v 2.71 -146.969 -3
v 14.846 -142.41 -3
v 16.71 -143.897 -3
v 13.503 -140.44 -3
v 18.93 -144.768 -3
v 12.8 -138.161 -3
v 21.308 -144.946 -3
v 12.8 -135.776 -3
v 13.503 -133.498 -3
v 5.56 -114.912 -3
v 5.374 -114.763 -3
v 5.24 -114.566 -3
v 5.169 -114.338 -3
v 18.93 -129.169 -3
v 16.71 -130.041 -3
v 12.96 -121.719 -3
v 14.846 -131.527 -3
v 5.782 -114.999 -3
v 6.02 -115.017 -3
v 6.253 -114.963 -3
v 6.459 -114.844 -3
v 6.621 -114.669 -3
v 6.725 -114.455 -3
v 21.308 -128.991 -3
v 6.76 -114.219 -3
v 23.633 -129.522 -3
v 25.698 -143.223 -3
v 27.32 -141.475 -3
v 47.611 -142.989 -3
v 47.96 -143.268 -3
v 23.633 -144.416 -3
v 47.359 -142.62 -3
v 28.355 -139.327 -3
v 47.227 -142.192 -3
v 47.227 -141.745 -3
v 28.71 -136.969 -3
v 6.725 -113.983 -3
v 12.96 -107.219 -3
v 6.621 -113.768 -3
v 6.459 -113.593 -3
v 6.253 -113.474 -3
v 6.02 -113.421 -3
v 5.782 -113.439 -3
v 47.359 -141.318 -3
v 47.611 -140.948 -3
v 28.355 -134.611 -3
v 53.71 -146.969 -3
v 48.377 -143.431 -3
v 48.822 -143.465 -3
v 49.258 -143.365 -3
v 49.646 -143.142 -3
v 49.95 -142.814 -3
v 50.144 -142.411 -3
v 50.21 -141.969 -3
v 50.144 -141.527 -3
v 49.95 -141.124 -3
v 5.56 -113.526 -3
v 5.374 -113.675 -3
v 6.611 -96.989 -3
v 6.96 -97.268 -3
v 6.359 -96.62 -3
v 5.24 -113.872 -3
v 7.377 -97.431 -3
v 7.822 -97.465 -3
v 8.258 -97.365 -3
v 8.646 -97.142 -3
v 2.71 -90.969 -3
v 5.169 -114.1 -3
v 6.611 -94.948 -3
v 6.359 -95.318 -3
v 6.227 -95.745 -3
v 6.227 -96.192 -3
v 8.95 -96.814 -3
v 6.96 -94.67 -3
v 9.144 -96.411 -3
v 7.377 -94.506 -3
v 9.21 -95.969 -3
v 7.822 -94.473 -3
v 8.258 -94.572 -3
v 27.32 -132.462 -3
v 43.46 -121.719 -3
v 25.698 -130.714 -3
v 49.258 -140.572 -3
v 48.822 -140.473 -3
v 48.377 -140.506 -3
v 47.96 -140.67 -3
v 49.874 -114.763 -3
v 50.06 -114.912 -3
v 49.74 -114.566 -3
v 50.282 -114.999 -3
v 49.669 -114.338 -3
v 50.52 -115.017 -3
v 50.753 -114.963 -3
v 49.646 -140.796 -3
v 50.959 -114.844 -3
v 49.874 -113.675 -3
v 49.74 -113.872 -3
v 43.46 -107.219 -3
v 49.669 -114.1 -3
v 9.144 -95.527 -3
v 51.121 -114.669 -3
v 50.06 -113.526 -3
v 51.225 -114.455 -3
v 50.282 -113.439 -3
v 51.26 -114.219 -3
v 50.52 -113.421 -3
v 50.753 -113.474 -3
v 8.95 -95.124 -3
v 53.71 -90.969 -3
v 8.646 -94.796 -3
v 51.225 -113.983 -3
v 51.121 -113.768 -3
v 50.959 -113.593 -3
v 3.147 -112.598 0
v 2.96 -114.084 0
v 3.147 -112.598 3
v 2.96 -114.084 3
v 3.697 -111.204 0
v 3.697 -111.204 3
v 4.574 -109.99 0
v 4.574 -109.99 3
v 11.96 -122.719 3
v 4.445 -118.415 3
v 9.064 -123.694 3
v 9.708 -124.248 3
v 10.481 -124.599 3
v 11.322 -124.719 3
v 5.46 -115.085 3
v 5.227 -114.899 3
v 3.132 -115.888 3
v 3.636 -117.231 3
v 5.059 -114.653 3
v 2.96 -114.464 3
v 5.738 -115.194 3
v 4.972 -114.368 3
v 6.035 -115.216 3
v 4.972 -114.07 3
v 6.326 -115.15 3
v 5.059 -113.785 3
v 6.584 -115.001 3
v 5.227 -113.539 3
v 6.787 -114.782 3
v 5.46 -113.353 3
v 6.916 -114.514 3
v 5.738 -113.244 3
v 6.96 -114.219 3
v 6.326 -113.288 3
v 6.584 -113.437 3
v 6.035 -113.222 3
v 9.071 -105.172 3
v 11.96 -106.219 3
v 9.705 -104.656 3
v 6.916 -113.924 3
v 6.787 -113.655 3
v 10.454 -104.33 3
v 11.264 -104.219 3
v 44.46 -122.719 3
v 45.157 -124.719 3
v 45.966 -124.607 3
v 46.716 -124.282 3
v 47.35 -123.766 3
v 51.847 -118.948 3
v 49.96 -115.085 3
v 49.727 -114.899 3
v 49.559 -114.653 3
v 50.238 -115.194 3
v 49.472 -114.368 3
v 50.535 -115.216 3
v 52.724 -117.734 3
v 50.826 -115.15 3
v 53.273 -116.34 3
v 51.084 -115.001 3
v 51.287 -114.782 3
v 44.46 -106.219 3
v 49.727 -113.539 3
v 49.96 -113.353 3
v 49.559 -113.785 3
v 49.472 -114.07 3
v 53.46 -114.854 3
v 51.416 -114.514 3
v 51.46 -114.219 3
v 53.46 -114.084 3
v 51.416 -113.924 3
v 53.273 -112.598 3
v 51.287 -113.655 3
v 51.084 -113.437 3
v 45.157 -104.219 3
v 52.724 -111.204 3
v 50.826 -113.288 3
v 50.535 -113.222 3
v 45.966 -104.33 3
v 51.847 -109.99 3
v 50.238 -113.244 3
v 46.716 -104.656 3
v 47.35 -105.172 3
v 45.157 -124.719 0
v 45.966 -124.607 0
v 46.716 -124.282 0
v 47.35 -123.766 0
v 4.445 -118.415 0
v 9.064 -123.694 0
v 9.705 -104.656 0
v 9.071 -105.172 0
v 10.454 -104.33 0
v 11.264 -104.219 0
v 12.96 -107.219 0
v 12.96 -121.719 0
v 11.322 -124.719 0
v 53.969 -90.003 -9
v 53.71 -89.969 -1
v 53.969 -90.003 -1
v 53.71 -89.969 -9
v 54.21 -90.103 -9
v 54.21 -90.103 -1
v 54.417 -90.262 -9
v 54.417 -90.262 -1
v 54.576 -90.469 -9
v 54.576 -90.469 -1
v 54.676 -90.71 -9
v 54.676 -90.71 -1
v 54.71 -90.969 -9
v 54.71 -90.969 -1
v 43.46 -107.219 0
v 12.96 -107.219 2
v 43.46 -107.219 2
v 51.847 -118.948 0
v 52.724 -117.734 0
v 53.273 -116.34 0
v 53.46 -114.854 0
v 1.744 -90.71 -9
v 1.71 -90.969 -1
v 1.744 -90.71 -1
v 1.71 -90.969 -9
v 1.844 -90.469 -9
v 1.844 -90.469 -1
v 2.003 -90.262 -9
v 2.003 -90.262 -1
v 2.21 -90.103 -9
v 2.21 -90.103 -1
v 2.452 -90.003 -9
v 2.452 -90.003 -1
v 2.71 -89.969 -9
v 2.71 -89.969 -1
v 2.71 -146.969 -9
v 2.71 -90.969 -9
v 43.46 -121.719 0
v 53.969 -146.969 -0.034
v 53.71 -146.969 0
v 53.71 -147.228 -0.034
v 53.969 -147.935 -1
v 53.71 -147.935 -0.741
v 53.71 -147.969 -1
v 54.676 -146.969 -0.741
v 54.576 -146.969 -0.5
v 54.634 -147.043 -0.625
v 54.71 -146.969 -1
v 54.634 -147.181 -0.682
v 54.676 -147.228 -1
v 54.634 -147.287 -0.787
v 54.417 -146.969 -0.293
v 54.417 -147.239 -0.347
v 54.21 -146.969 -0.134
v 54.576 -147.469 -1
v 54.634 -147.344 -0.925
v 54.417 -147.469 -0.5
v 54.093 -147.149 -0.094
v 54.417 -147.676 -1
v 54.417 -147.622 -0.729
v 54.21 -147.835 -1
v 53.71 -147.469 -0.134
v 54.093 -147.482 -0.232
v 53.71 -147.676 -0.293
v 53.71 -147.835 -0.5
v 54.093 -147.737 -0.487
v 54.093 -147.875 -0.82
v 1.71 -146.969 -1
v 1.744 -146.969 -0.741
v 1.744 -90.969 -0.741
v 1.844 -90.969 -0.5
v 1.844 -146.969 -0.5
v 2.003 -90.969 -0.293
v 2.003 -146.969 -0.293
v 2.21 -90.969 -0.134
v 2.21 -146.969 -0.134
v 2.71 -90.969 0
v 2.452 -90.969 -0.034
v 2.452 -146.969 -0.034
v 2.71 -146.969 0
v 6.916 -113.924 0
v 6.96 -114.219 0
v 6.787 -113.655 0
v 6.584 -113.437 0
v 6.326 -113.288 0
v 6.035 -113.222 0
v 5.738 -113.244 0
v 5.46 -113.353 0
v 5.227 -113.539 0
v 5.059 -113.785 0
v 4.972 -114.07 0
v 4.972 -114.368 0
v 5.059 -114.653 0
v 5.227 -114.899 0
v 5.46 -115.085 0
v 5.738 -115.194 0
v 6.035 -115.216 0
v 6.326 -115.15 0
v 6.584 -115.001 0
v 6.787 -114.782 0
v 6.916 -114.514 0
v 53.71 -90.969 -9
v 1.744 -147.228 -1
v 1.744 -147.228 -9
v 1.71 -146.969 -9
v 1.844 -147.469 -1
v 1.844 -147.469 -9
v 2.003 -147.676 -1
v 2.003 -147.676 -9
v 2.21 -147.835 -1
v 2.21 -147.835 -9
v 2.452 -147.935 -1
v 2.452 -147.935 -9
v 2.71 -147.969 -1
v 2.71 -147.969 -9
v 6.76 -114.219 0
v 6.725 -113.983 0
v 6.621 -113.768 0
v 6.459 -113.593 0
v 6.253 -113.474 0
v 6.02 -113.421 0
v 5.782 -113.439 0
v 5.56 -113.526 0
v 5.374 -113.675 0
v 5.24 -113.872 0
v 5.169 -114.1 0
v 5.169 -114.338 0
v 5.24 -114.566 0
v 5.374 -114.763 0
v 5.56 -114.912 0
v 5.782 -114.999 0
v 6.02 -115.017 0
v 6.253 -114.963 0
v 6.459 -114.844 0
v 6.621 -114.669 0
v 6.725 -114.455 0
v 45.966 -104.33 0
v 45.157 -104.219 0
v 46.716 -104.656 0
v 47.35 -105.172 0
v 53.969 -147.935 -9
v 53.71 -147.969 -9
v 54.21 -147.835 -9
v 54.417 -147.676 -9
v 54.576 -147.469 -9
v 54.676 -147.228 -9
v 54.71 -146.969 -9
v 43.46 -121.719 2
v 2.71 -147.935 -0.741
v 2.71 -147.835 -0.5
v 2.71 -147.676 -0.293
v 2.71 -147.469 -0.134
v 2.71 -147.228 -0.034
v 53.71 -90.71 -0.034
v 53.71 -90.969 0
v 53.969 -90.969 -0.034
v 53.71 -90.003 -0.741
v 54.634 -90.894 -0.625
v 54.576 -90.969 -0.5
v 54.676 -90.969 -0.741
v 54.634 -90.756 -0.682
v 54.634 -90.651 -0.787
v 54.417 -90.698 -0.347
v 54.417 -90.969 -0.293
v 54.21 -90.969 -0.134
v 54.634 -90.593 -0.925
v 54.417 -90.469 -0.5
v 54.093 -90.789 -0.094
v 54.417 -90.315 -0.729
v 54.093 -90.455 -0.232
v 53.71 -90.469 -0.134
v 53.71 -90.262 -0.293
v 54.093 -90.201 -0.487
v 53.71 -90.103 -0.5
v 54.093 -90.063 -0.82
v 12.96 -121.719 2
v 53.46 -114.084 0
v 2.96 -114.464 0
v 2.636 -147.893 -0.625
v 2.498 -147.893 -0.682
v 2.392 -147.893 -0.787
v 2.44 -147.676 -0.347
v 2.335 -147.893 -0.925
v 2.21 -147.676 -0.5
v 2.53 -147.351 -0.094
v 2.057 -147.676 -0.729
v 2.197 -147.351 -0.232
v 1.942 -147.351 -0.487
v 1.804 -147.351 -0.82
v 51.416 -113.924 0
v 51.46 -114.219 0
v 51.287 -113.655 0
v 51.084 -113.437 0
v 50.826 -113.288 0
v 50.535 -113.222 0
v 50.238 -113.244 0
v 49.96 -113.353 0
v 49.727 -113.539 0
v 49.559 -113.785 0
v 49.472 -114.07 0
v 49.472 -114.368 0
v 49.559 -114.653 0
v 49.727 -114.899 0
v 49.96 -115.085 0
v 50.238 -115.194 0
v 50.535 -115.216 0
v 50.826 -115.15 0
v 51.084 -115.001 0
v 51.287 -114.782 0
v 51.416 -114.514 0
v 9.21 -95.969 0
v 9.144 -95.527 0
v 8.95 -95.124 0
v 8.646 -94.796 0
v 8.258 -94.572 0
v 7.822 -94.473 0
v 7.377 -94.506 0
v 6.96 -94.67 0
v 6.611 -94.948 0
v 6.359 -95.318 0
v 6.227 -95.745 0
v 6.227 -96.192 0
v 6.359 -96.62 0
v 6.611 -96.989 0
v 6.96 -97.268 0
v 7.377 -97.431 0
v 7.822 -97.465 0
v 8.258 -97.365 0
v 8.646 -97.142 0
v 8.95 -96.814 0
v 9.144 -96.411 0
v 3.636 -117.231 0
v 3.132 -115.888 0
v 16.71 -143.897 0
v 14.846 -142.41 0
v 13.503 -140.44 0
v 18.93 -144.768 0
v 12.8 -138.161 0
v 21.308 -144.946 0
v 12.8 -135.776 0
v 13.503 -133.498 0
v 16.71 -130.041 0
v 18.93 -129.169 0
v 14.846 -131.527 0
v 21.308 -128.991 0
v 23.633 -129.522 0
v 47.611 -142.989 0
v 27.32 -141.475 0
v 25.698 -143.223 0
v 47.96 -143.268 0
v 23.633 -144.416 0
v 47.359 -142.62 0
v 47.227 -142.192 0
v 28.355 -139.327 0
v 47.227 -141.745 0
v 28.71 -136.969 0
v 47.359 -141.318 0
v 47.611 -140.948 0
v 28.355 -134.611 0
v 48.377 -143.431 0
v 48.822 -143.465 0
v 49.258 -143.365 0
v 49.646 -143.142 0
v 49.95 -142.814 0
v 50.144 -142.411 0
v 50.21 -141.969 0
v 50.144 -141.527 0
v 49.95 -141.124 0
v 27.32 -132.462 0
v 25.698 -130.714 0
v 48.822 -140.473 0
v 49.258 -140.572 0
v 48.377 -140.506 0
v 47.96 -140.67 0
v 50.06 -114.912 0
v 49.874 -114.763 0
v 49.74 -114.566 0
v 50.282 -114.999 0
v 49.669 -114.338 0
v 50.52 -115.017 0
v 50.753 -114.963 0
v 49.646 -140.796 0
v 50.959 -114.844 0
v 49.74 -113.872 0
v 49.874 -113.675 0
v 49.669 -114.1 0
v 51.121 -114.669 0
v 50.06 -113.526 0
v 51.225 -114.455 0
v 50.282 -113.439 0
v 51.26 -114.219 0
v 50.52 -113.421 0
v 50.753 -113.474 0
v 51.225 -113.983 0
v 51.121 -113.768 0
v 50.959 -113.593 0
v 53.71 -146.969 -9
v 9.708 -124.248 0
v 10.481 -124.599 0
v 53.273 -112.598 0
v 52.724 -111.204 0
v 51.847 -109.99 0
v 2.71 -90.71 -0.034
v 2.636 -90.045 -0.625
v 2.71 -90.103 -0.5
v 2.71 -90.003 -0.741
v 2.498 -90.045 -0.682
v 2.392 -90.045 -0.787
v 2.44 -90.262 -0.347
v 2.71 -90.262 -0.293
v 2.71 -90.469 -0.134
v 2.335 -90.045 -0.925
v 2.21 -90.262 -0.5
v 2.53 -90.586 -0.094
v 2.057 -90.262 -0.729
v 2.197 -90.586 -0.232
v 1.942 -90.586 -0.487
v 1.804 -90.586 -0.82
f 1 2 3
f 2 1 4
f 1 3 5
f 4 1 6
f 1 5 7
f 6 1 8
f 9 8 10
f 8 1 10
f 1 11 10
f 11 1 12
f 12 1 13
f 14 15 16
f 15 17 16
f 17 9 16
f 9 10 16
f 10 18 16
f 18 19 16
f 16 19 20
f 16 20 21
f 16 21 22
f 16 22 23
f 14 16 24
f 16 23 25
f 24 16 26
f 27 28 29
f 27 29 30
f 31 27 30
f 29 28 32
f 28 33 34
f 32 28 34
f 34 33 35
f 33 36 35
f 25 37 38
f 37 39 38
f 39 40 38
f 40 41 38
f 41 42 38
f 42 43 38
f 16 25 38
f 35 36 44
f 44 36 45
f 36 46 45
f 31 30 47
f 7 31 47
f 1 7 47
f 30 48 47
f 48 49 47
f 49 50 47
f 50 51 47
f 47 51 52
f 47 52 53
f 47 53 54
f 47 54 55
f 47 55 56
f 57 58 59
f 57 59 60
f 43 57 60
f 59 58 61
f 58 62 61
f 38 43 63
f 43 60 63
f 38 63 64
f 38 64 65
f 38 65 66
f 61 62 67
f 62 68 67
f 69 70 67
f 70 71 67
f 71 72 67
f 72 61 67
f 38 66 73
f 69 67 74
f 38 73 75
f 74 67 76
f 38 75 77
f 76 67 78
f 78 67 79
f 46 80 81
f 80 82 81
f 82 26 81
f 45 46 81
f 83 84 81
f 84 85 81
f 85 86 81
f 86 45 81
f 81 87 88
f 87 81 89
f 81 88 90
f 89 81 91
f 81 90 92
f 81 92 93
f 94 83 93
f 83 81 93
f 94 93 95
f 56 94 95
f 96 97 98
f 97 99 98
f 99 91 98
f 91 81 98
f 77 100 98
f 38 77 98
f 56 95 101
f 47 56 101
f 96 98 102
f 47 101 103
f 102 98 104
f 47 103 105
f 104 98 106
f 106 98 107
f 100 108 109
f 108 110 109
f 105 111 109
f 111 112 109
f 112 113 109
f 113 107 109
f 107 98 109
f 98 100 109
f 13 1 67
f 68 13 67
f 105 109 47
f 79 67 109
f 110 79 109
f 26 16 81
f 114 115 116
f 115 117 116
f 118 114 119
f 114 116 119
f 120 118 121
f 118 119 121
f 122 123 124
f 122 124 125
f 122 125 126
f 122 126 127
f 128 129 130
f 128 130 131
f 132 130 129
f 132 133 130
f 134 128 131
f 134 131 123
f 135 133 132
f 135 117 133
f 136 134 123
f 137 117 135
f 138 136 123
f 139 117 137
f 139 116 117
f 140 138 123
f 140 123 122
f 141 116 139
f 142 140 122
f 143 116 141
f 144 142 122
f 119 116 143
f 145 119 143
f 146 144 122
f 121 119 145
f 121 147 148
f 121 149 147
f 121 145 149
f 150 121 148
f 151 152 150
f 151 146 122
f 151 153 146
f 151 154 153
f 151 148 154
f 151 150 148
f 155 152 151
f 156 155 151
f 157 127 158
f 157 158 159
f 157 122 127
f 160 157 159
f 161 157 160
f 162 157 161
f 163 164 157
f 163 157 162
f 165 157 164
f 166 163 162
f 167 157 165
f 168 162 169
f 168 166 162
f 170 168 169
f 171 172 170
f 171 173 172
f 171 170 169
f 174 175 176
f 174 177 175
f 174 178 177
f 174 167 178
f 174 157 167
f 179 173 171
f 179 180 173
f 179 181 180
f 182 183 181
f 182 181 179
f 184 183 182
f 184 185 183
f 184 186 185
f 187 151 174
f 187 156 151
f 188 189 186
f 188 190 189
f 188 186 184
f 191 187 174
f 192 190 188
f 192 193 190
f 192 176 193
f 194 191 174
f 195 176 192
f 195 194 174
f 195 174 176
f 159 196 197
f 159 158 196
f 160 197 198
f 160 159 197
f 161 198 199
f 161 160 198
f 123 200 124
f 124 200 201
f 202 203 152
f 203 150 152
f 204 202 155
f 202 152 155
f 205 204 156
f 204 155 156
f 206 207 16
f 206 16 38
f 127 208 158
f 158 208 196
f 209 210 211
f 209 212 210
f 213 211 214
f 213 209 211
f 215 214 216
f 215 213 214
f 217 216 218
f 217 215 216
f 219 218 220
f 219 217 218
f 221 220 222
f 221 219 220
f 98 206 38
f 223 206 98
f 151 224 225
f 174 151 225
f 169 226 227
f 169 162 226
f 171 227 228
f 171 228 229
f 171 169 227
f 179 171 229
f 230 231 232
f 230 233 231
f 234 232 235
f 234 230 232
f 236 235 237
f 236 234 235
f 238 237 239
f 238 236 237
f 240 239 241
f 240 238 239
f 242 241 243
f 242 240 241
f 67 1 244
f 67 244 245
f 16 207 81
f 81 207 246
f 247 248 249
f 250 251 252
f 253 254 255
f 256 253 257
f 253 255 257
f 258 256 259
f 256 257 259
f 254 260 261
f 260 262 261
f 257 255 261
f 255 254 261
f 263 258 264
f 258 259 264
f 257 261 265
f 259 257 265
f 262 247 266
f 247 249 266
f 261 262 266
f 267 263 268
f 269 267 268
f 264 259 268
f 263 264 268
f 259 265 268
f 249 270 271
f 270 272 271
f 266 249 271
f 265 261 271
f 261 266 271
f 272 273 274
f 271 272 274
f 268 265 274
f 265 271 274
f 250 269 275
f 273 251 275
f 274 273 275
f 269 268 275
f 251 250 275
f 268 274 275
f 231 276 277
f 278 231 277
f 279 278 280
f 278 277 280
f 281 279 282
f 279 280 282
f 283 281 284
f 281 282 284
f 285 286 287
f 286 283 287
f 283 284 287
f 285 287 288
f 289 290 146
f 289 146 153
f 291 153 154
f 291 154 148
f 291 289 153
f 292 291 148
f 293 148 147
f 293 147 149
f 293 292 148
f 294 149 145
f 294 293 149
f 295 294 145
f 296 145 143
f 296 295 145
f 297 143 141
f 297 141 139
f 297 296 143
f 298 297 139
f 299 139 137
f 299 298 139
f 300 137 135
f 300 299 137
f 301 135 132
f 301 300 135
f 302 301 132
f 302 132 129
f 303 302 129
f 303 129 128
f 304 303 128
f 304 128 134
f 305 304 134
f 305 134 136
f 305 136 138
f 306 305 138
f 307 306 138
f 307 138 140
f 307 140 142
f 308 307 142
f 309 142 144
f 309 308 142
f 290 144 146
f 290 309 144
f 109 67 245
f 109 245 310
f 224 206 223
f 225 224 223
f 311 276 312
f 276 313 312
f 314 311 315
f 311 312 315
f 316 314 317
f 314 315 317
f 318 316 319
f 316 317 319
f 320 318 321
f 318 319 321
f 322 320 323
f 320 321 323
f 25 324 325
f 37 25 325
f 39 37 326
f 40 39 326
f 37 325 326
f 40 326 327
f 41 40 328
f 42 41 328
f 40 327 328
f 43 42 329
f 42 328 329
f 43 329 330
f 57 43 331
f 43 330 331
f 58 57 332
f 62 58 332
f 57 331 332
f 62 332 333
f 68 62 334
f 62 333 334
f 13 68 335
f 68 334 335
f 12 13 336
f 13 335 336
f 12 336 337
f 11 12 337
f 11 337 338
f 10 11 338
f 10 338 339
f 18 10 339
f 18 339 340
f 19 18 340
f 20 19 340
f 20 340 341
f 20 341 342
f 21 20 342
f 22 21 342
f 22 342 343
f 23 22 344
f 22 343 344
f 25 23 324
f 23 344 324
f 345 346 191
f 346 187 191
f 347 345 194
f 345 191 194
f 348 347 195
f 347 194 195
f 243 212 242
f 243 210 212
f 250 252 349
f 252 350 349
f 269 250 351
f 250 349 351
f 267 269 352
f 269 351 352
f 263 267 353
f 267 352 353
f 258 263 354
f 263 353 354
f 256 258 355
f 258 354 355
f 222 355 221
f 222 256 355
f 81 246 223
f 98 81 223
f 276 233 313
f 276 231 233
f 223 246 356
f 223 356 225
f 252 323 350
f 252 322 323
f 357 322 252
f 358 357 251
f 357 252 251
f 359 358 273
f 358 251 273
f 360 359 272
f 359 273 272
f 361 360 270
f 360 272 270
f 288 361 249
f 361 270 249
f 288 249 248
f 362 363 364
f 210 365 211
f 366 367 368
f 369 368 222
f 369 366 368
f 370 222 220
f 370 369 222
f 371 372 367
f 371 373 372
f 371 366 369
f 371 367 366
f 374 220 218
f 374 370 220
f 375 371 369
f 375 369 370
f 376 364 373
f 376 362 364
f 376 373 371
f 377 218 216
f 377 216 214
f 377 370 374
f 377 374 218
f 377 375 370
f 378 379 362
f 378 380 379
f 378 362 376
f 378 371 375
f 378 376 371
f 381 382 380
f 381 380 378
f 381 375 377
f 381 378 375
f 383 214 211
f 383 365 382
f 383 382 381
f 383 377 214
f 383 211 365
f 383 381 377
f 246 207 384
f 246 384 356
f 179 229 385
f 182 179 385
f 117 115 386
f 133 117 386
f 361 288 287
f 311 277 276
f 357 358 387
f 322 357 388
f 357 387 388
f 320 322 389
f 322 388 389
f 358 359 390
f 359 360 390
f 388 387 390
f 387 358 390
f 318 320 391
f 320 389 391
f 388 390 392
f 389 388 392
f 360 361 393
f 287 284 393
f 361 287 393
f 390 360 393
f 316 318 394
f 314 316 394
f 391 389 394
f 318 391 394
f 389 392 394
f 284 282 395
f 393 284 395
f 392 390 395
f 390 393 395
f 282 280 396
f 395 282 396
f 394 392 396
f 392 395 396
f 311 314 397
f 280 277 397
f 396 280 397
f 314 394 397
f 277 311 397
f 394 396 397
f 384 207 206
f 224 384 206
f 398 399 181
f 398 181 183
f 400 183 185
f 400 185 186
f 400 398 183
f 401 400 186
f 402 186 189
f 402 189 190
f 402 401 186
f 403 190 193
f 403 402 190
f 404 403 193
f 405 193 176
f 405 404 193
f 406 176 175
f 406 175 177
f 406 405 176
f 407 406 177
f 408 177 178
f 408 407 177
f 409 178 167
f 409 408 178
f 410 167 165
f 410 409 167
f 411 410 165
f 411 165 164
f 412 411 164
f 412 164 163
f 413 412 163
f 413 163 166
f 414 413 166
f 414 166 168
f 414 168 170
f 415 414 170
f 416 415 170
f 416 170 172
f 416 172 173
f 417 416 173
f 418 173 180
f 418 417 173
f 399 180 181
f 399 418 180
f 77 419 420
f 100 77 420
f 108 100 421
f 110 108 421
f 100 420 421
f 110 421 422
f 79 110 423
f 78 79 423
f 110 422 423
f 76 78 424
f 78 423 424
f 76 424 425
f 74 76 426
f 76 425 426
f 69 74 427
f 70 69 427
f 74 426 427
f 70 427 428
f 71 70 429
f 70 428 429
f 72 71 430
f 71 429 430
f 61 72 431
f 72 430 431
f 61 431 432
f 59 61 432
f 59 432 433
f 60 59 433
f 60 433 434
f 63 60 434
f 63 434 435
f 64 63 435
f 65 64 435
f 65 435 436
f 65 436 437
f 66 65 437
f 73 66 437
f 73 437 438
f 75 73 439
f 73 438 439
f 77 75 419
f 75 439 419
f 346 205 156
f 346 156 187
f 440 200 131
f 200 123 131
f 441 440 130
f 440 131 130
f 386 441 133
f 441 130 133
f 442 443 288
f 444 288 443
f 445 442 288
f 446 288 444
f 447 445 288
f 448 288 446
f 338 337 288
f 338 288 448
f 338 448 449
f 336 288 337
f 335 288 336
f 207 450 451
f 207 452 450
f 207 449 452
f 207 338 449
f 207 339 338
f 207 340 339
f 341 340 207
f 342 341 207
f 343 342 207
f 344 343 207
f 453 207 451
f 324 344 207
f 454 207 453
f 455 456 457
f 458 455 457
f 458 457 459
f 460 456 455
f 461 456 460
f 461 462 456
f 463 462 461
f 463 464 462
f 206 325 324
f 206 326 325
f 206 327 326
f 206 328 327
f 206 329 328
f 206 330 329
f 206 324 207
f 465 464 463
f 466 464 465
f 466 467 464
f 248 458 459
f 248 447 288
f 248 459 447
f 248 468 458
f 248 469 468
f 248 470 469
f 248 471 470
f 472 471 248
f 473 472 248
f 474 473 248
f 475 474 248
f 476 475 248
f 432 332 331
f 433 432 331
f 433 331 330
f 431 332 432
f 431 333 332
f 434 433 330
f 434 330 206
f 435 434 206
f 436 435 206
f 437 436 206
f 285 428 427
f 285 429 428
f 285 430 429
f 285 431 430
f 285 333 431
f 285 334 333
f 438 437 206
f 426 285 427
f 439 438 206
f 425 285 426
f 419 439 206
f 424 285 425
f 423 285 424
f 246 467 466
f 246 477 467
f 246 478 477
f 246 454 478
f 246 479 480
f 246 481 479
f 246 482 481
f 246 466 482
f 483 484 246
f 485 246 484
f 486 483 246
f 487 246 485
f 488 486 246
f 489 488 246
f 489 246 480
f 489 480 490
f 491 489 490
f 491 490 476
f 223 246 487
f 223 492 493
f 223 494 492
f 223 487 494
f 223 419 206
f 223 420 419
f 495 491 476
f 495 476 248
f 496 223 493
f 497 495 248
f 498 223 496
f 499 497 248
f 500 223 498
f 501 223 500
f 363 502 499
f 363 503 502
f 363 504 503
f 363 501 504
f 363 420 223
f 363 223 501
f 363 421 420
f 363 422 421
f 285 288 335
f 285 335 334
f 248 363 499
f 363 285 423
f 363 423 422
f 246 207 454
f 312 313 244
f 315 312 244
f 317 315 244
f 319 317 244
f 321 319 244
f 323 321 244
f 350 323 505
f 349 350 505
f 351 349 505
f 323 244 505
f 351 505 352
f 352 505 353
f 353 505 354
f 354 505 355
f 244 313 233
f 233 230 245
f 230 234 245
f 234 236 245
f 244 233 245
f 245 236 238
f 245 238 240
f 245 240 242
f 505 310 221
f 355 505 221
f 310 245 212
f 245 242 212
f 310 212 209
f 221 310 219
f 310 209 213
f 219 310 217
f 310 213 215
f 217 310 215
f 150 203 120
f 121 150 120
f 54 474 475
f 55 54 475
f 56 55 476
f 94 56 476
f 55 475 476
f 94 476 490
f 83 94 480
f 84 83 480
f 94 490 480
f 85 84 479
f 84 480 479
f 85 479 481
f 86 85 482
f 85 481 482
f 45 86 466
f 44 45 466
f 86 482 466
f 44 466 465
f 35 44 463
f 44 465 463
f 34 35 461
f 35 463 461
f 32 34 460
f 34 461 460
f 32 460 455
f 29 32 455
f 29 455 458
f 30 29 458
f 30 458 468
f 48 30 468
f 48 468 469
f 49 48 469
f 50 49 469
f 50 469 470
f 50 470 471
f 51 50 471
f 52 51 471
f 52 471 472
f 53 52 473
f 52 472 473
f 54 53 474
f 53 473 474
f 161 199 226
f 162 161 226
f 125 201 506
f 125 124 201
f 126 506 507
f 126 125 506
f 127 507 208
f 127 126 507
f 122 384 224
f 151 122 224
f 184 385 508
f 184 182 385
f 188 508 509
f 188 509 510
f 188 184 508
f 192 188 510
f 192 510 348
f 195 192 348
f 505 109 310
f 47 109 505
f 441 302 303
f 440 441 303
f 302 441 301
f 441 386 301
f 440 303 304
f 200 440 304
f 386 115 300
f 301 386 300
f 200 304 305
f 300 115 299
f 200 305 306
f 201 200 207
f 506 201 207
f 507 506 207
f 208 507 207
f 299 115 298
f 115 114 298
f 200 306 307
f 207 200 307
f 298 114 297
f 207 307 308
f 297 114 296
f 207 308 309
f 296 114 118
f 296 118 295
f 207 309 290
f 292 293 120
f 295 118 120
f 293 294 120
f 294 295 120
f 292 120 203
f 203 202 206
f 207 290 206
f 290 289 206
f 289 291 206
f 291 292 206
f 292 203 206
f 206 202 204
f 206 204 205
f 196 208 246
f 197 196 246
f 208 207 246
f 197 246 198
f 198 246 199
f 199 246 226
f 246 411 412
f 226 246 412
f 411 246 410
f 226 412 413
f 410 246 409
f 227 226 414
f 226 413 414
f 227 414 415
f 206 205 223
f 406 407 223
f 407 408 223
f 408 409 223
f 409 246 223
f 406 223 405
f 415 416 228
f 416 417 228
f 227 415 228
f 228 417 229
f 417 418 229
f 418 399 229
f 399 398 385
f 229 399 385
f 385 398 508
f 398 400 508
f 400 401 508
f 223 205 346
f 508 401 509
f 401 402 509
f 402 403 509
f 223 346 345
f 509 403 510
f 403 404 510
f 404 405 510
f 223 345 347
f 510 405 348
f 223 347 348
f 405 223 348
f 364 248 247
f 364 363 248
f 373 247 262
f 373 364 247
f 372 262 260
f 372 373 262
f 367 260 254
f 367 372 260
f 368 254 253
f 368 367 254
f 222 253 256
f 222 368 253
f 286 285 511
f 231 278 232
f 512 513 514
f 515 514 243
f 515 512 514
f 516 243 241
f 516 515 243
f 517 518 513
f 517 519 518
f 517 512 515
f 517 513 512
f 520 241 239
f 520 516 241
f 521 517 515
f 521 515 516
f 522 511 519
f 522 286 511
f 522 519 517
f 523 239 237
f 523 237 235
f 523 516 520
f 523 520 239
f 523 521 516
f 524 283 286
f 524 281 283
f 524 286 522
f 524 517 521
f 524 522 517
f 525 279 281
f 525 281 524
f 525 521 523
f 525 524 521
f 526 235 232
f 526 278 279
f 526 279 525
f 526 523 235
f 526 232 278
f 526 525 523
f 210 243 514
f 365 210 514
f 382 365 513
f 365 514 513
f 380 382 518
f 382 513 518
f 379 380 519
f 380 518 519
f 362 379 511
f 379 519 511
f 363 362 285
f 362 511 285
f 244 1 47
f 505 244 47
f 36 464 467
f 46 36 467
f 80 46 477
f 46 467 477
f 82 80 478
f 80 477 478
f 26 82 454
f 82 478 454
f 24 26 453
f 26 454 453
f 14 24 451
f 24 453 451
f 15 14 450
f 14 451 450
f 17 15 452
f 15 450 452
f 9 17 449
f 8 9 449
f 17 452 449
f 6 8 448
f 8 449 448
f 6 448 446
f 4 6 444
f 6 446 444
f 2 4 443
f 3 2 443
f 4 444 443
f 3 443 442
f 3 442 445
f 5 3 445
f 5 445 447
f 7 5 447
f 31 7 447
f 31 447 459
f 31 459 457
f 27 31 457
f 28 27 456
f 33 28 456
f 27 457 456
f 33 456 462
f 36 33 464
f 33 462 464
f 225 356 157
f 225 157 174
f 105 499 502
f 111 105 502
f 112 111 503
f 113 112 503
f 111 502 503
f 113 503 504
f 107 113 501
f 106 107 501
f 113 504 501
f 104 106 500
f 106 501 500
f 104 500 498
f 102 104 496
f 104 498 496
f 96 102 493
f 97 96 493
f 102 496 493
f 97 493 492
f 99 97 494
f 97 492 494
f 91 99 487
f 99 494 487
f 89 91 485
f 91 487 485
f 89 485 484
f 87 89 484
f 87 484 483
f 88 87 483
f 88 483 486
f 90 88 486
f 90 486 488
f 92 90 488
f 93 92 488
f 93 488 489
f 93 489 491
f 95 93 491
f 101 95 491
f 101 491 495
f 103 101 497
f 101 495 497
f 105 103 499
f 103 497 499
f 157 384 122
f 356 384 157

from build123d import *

# Parameters (mm, degrees)
F0_W      = 51
F0_H      = 56
F0_R      = 6.1
F0_R_2    = 1.5
F0_W_2    = 5
F0_H_2    = 14.5
F1_DEPTH  = 1
F2_W      = 30
F2_H      = 14
F5_DEPTH  = 4
F2_W_2    = 51
F2_H_2    = 56
F2_R      = 8
F2_R_2    = 1.5
F2_R_3    = 0.8
F2_W_3    = 30.5
F2_H_3    = 14.5
F6_DEPTH  = 3
F2_W_4    = 5
F2_H_4    = 2
F2_H_5    = 5
F7_DEPTH  = 2
F3_W      = 27.8
F3_H      = 11.8
F8_DEPTH  = 1.5
F2_H_6    = 1
F9_DEPTH  = 9
F10_W     = 36.5
F10_H     = 20.5
F10_W_2   = 30.5
F10_H_2   = 14.5
F10_R     = 1
F11_DEPTH = 3
F12_R     = 6
F13_R     = 3
F14_R     = 1
F15_SIZE  = 1
F18_DEPTH = 1
F19_D     = 1.4
F19_DEPTH = 1.001
F21_D     = 1.4
F16_W     = 51
F16_H     = 56
F16_W_2   = 25
F16_H_2   = 18
F16_R     = 1.5
F22_DEPTH = 5
F23_W     = 0.2
F23_H     = 55.6
F24_DEPTH = 25
F25_D     = 1.6
F25_DEPTH = 5.001
F26_D     = 1.6


# Not quite as in the source:
# - a feature names something its author has since deleted; it is built from what else it names


with BuildPart() as f1:
    # F0 (on Top) → F1 (new body)
    with BuildSketch(Plane.XY):
        Rectangle(F0_W, F0_H)
        with Locations((-7.5, -18)):
            Circle(F0_R, mode=Mode.SUBTRACT)
        with Locations((20.5, -23)):
            Circle(F0_R_2, mode=Mode.SUBTRACT)
        with Locations((-20.5, 23)):
            Circle(F0_R_2, mode=Mode.SUBTRACT)
        Polygon((-15.25, -2.75), (-15.25, 11.75), (-2.5, 11.75), (2.5, 11.75), (15.25, 11.75), (15.25, -2.75), (2.5, -2.75), (-2.5, -2.75), align=None, mode=Mode.SUBTRACT)
        with Locations((0, 4.5)):
            Rectangle(F0_W_2, F0_H_2)
    extrude(amount=F1_DEPTH)

    # F18 (add): a face of the model
    f18_faces = [f1.faces().sort_by_distance(p)[0] for p in [
        (0.3722548806, 0.1869472989, 1),
    ]]
    extrude(f18_faces, amount=F18_DEPTH)

    # F19 (through all, one way)
    with BuildSketch(Plane.XY.offset(1)):
        with Locations((-22.25, 4.75), (22.25, 4.75)):
            Circle(F19_D / 2)
    extrude(amount=-F19_DEPTH, mode=Mode.SUBTRACT)

    # F21 (through all)
    with Locations(Plane(origin=(0, 0, 1), x_dir=(1, 0, 0), z_dir=(0, 0, -1))):
        with Locations((-22.25, -4.75), (22.25, -4.75)):
            Hole(F21_D / 2)

    # F16 (on face) → F22 (join)
    with BuildSketch(Plane.XY.offset(1)):
        Rectangle(F16_W, F16_H)
        with Locations((-7.5, -18)):
            Rectangle(F16_W_2, F16_H_2, mode=Mode.SUBTRACT)
        with Locations((20.5, -23)):
            Circle(F16_R, mode=Mode.SUBTRACT)
        with Locations((-20.5, 23)):
            Circle(F16_R, mode=Mode.SUBTRACT)
        Polygon((-15.25, -2.75), (-15.25, 11.75), (-2.5, 11.75), (2.5, 11.75), (15.25, 11.75), (15.25, -2.75), (2.5, -2.75), (-2.5, -2.75), align=None, mode=Mode.SUBTRACT)
    extrude(amount=F22_DEPTH)

    # F23 (on face) → F24 (cut)
    with BuildSketch(Plane(origin=(0, 0, 0), x_dir=(1, 0, 0), z_dir=(0, 0, -1))):
        Polygon((25.5, 28), (-25.5, 28), (-25.5, 27.8), (-25.3, 27.8), (25.3, 27.8), (25.5, 27.8), align=None)
        with Locations((-25.4, 0)):
            Rectangle(F23_W, F23_H)
        with Locations((25.4, 0)):
            Rectangle(F23_W, F23_H)
        Polygon((-25.3, -27.8), (-25.5, -27.8), (-25.5, -28), (25.5, -28), (25.5, -27.8), (25.3, -27.8), align=None)
    extrude(amount=-F24_DEPTH, mode=Mode.SUBTRACT)

    # F25 (through all, one way)
    with BuildSketch(Plane(origin=(0, 0, 1), x_dir=(1, 0, 0), z_dir=(0, 0, -1))):
        with Locations((-22.25, -4.75), (22.25, -4.75)):
            Circle(F25_D / 2)
    extrude(amount=-F25_DEPTH, mode=Mode.SUBTRACT)

    # F26 (through all)
    with Locations(Plane.XY.offset(1)):
        with Locations((22.25, 4.75), (-22.25, 4.75)):
            Hole(F26_D / 2)


with BuildPart() as f5:
    # F2 (on Top) → F5 (new body)
    with BuildSketch(Plane.XY):
        with Locations((-48.0005137329, -108.0776734079)):
            Rectangle(F2_W, F2_H)
        Polygon((-62.0005137329, -114.0776734079), (-62.0005137329, -102.0776734079), (-50.5005137329, -102.0776734079), (-45.5005137329, -102.0776734079), (-34.0005137329, -102.0776734079), (-34.0005137329, -107.0776734079), (-34.0005137329, -109.0776734079), (-34.0005137329, -114.0776734079), (-45.5005137329, -114.0776734079), (-50.5005137329, -114.0776734079), align=None, mode=Mode.SUBTRACT)
    extrude(amount=F5_DEPTH)

    # F2 (on Top) → F7 (join)
    with BuildSketch(Plane.XY):
        with Locations((-48.0005137329, -108.0776734079)):
            Rectangle(F2_W_4, F2_H_4)
        with Locations((-48.0005137329, -104.5776734079)):
            Rectangle(F2_W_4, F2_H_5)
        with Locations((-48.0005137329, -111.5776734079)):
            Rectangle(F2_W_4, F2_H_5)
    extrude(amount=F7_DEPTH)


with BuildPart() as f6:
    # F2 (on Top) → F6 (new body)
    with BuildSketch(Plane.XY):
        with Locations((28.2103444552, -118.9687541723)):
            Rectangle(F2_W_2, F2_H_2)
        with Locations((20.7103444552, -136.9687541723)):
            Circle(F2_R, mode=Mode.SUBTRACT)
        with Locations((48.7103444552, -141.9687541723)):
            Circle(F2_R_2, mode=Mode.SUBTRACT)
        with Locations((5.9603444552, -114.2187541723)):
            Circle(F2_R_3, mode=Mode.SUBTRACT)
        with Locations((28.2103444552, -114.4687541723)):
            Rectangle(F2_W_3, F2_H_3, mode=Mode.SUBTRACT)
        with Locations((50.4603444552, -114.2187541723)):
            Circle(F2_R_3, mode=Mode.SUBTRACT)
        with Locations((7.7103444552, -95.9687541723)):
            Circle(F2_R_2, mode=Mode.SUBTRACT)
    extrude(amount=-F6_DEPTH)

    # F2 (on Top) → F9 (join)
    with BuildSketch(Plane.XY):
        Polygon((2.7103444552, -146.9687541723), (2.7103444552, -90.9687541723), (2.7103444552, -89.9687541723), (1.7103444552, -89.9687541723), (1.7103444552, -147.9687541723), (2.7103444552, -147.9687541723), align=None)
        with Locations((28.2103444552, -90.4687541723)):
            Rectangle(F2_W_2, F2_H_6)
        with Locations((28.2103444552, -147.4687541723)):
            Rectangle(F2_W_2, F2_H_6)
        Polygon((53.7103444552, -89.9687541723), (53.7103444552, -90.9687541723), (53.7103444552, -146.9687541723), (53.7103444552, -147.9687541723), (54.7103444552, -147.9687541723), (54.7103444552, -89.9687541723), align=None)
    extrude(amount=-F9_DEPTH)

    # F14
    f14_edges = [f6.edges().sort_by_distance(p)[0] for p in [
        (1.710344, -118.968754, 0),
        (28.210344, -89.968754, 0),
        (28.210344, -147.968754, 0),
        (54.710344, -118.968754, 0),
        (54.710344, -147.968754, -4.5),
        (1.710344, -147.968754, -4.5),
        (1.710344, -89.968754, -4.5),
        (54.710344, -89.968754, -4.5),
    ]]
    fillet(f14_edges, radius=F14_R)


with BuildPart() as f8:
    # F3 (on Top) → F8 (new body)
    with BuildSketch(Plane.XY):
        with Locations((-52.0366017878, -79.3675661445)):
            Rectangle(F3_W, F3_H)
    extrude(amount=F8_DEPTH)


with BuildPart() as f11:
    # F10 (on face) → F11 (new body)
    with BuildSketch(Plane.XY):
        with Locations((28.2103444552, -114.4687541723)):
            Rectangle(F10_W, F10_H)
        with Locations((28.2103444552, -114.4687541723)):
            Rectangle(F10_W_2, F10_H_2, mode=Mode.SUBTRACT)
        Polygon((9.9603444552, -124.7187541723), (9.9603444552, -104.2187541723), (2.9603444552, -111.7187541723), (2.9603444552, -116.7187541723), align=None)
        with Locations((5.9603444552, -114.2187541723)):
            Circle(F10_R, mode=Mode.SUBTRACT)
        Polygon((53.4603444552, -111.7187541723), (46.4603444552, -104.2187541723), (46.4603444552, -124.7187541723), (53.4603444552, -117.2187541723), align=None)
        with Locations((50.4603444552, -114.2187541723)):
            Circle(F10_R, mode=Mode.SUBTRACT)
    extrude(amount=F11_DEPTH)

    # F12
    f12_edges = [f11.edges().sort_by_distance(p)[0] for p in [
        (2.960344, -111.718754, 1.5),
        (2.960344, -116.718754, 1.5),
        (53.460344, -117.218754, 1.5),
        (53.460344, -111.718754, 1.5),
    ]]
    fillet(f12_edges, radius=F12_R)

    # F13
    f13_edges = [f11.edges().sort_by_distance(p)[0] for p in [
        (9.960344, -104.218754, 1.5),
        (9.960344, -124.718754, 1.5),
        (46.460344, -124.718754, 1.5),
        (46.460344, -104.218754, 1.5),
    ]]
    fillet(f13_edges, radius=F13_R)

    # F15
    f15_edges = [f11.edges().sort_by_distance(p)[0] for p in [
        (12.960344, -114.468754, 3),
        (28.210344, -107.218754, 3),
        (43.460344, -114.468754, 3),
        (28.210344, -121.718754, 3),
    ]]
    chamfer(f15_edges, length=F15_SIZE)


solid = Compound([f6.part, f11.part])
